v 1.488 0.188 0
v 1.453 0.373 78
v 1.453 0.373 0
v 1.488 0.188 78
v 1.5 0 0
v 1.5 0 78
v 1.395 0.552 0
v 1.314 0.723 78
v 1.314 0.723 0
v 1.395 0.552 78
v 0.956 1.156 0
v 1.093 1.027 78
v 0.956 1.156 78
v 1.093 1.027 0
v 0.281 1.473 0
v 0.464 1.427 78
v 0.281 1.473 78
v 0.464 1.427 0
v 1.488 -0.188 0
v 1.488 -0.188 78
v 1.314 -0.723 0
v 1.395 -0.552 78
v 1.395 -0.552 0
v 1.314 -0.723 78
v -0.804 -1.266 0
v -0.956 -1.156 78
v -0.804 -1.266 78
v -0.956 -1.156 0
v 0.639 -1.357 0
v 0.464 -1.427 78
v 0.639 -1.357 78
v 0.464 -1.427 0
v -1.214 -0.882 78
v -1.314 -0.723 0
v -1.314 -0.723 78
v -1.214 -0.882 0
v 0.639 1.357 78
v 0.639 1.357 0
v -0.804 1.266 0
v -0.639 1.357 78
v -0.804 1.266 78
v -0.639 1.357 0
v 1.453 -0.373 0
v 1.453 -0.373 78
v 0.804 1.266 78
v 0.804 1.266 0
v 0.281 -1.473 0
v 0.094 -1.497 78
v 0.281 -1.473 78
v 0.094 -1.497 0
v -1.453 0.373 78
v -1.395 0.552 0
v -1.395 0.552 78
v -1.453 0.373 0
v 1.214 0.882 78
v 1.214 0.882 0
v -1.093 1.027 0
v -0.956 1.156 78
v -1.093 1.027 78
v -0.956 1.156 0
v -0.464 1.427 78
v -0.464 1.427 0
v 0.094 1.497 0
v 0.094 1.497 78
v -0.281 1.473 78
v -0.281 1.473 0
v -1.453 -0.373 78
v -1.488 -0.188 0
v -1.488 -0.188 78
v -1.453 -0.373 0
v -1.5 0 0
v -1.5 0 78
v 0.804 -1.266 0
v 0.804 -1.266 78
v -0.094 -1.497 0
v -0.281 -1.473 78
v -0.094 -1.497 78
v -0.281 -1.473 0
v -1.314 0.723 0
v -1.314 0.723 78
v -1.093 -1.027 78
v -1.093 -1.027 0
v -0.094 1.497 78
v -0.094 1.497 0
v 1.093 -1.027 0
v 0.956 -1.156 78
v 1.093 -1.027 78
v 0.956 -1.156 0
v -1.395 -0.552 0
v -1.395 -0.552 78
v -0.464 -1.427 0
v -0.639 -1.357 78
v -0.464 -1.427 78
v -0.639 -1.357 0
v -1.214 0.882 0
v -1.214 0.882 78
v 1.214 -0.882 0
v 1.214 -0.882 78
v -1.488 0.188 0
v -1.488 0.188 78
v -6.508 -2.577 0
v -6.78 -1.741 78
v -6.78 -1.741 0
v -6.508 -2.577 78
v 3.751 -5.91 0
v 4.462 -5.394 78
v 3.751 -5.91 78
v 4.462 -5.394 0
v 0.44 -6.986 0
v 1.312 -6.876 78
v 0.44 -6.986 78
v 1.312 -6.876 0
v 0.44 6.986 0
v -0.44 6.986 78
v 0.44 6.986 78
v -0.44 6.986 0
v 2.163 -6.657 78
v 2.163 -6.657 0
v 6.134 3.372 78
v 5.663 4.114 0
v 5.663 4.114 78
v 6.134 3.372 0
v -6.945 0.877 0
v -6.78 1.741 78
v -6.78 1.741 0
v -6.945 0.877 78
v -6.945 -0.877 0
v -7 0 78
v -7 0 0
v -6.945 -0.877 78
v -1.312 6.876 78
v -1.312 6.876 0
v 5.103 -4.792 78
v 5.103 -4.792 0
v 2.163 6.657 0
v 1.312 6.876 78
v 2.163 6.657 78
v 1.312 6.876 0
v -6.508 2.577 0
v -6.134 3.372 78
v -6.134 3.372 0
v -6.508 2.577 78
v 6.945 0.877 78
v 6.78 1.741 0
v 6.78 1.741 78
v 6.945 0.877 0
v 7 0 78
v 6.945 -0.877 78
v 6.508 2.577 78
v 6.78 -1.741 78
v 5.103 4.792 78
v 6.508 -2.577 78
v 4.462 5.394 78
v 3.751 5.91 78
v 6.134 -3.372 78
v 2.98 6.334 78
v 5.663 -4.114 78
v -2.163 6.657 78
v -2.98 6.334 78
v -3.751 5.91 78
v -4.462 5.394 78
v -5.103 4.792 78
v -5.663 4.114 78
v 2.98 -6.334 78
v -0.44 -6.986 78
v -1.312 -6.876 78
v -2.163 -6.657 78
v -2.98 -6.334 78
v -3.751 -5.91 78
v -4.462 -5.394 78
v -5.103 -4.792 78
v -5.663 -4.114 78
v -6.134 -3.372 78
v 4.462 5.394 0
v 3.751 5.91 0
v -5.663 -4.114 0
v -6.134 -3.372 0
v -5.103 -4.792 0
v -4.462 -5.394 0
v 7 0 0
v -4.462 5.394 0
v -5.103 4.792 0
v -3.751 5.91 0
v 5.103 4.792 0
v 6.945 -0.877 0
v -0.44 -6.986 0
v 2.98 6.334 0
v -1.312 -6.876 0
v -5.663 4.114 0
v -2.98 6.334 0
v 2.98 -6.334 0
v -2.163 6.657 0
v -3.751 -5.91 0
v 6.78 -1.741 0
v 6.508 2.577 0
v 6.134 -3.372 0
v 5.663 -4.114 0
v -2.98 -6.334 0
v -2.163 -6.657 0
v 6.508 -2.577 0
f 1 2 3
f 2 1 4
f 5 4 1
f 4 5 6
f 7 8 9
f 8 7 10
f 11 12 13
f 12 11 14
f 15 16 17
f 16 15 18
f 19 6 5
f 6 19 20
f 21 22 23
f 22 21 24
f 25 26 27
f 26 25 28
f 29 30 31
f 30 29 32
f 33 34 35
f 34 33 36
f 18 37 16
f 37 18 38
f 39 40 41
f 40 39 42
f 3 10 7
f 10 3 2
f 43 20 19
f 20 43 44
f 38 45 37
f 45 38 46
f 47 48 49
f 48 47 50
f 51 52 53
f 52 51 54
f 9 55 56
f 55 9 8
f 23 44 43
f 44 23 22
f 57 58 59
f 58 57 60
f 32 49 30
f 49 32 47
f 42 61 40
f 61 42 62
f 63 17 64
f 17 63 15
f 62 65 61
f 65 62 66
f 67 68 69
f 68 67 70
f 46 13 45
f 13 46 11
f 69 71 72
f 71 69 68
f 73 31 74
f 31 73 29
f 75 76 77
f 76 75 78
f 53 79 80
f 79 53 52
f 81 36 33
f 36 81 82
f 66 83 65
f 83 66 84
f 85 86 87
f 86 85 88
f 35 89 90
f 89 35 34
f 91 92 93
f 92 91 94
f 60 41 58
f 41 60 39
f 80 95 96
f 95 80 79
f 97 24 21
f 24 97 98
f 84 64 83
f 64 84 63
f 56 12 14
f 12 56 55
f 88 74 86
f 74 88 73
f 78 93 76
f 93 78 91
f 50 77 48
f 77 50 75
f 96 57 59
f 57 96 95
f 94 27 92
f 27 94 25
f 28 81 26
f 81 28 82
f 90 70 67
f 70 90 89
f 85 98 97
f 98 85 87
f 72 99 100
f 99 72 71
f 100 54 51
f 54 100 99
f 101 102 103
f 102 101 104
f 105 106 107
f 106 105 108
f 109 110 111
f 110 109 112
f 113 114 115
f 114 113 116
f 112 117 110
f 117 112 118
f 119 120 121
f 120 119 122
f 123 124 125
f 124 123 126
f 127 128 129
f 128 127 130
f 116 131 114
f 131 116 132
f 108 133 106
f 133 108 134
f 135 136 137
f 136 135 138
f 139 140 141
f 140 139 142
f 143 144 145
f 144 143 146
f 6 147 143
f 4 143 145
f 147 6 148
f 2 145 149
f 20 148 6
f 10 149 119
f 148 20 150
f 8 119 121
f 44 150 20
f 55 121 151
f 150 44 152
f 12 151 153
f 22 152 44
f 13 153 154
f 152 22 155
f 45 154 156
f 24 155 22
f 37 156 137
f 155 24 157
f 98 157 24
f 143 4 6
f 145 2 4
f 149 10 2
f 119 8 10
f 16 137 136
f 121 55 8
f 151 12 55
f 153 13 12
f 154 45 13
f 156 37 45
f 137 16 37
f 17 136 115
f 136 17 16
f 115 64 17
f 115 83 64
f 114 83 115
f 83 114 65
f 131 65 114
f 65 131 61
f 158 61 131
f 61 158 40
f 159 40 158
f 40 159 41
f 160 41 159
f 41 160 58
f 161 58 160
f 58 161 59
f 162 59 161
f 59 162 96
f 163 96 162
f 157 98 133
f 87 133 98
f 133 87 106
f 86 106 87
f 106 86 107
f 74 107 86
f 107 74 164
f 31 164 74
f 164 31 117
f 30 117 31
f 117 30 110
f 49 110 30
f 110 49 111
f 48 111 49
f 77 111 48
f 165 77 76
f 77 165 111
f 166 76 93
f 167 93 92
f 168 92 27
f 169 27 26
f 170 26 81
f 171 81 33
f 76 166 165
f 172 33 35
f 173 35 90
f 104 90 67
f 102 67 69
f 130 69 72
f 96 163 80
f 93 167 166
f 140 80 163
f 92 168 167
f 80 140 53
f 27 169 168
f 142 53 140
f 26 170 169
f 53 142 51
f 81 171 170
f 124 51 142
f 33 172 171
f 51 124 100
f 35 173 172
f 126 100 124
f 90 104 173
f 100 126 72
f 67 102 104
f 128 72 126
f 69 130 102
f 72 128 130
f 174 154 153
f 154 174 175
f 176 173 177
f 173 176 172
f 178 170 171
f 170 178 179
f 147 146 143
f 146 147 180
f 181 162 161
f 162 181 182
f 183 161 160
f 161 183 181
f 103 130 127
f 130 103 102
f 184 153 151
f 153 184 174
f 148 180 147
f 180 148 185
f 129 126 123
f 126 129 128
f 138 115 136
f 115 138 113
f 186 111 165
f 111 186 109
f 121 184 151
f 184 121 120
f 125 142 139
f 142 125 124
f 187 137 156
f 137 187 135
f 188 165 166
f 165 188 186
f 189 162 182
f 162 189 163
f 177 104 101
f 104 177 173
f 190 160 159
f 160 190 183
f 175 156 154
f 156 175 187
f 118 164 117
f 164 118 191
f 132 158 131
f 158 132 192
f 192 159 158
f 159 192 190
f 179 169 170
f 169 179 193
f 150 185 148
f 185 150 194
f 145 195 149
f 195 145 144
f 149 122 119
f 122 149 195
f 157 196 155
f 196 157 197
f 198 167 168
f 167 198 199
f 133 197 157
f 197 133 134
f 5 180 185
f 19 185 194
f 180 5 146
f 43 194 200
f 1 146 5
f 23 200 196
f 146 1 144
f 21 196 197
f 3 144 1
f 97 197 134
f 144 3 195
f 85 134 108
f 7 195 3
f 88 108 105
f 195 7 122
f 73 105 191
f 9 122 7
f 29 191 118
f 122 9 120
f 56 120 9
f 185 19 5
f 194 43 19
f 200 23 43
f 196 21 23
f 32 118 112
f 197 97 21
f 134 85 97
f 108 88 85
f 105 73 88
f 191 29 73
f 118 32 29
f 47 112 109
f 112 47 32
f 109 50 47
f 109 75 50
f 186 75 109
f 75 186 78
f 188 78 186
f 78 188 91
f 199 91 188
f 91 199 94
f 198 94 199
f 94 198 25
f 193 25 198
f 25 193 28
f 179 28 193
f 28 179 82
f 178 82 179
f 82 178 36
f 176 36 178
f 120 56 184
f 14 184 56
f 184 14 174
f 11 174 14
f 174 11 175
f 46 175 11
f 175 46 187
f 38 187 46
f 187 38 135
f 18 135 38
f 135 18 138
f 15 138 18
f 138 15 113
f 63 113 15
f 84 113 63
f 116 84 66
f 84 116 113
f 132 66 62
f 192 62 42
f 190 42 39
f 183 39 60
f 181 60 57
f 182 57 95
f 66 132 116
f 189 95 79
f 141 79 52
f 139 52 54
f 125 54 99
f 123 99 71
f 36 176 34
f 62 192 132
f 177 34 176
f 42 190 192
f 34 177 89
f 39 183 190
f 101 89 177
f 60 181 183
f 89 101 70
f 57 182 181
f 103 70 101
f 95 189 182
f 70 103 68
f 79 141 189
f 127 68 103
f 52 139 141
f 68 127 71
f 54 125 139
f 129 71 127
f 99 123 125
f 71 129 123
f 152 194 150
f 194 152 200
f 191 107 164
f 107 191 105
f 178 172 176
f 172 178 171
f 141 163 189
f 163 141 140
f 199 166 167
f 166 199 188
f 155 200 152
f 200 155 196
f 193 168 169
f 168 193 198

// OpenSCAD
$fn = 50;


difference() {
	union() {
		cylinder(h = 78, r = 7.0000000000);
	}
	union() {
		translate(v = [0, 0, -100]) {
			cylinder(h = 200, r = 1.5000000000);
		}
		translate(v = [0, 0, -100]) {
			cylinder(h = 200, r = 1.5000000000);
		}
	}
}
